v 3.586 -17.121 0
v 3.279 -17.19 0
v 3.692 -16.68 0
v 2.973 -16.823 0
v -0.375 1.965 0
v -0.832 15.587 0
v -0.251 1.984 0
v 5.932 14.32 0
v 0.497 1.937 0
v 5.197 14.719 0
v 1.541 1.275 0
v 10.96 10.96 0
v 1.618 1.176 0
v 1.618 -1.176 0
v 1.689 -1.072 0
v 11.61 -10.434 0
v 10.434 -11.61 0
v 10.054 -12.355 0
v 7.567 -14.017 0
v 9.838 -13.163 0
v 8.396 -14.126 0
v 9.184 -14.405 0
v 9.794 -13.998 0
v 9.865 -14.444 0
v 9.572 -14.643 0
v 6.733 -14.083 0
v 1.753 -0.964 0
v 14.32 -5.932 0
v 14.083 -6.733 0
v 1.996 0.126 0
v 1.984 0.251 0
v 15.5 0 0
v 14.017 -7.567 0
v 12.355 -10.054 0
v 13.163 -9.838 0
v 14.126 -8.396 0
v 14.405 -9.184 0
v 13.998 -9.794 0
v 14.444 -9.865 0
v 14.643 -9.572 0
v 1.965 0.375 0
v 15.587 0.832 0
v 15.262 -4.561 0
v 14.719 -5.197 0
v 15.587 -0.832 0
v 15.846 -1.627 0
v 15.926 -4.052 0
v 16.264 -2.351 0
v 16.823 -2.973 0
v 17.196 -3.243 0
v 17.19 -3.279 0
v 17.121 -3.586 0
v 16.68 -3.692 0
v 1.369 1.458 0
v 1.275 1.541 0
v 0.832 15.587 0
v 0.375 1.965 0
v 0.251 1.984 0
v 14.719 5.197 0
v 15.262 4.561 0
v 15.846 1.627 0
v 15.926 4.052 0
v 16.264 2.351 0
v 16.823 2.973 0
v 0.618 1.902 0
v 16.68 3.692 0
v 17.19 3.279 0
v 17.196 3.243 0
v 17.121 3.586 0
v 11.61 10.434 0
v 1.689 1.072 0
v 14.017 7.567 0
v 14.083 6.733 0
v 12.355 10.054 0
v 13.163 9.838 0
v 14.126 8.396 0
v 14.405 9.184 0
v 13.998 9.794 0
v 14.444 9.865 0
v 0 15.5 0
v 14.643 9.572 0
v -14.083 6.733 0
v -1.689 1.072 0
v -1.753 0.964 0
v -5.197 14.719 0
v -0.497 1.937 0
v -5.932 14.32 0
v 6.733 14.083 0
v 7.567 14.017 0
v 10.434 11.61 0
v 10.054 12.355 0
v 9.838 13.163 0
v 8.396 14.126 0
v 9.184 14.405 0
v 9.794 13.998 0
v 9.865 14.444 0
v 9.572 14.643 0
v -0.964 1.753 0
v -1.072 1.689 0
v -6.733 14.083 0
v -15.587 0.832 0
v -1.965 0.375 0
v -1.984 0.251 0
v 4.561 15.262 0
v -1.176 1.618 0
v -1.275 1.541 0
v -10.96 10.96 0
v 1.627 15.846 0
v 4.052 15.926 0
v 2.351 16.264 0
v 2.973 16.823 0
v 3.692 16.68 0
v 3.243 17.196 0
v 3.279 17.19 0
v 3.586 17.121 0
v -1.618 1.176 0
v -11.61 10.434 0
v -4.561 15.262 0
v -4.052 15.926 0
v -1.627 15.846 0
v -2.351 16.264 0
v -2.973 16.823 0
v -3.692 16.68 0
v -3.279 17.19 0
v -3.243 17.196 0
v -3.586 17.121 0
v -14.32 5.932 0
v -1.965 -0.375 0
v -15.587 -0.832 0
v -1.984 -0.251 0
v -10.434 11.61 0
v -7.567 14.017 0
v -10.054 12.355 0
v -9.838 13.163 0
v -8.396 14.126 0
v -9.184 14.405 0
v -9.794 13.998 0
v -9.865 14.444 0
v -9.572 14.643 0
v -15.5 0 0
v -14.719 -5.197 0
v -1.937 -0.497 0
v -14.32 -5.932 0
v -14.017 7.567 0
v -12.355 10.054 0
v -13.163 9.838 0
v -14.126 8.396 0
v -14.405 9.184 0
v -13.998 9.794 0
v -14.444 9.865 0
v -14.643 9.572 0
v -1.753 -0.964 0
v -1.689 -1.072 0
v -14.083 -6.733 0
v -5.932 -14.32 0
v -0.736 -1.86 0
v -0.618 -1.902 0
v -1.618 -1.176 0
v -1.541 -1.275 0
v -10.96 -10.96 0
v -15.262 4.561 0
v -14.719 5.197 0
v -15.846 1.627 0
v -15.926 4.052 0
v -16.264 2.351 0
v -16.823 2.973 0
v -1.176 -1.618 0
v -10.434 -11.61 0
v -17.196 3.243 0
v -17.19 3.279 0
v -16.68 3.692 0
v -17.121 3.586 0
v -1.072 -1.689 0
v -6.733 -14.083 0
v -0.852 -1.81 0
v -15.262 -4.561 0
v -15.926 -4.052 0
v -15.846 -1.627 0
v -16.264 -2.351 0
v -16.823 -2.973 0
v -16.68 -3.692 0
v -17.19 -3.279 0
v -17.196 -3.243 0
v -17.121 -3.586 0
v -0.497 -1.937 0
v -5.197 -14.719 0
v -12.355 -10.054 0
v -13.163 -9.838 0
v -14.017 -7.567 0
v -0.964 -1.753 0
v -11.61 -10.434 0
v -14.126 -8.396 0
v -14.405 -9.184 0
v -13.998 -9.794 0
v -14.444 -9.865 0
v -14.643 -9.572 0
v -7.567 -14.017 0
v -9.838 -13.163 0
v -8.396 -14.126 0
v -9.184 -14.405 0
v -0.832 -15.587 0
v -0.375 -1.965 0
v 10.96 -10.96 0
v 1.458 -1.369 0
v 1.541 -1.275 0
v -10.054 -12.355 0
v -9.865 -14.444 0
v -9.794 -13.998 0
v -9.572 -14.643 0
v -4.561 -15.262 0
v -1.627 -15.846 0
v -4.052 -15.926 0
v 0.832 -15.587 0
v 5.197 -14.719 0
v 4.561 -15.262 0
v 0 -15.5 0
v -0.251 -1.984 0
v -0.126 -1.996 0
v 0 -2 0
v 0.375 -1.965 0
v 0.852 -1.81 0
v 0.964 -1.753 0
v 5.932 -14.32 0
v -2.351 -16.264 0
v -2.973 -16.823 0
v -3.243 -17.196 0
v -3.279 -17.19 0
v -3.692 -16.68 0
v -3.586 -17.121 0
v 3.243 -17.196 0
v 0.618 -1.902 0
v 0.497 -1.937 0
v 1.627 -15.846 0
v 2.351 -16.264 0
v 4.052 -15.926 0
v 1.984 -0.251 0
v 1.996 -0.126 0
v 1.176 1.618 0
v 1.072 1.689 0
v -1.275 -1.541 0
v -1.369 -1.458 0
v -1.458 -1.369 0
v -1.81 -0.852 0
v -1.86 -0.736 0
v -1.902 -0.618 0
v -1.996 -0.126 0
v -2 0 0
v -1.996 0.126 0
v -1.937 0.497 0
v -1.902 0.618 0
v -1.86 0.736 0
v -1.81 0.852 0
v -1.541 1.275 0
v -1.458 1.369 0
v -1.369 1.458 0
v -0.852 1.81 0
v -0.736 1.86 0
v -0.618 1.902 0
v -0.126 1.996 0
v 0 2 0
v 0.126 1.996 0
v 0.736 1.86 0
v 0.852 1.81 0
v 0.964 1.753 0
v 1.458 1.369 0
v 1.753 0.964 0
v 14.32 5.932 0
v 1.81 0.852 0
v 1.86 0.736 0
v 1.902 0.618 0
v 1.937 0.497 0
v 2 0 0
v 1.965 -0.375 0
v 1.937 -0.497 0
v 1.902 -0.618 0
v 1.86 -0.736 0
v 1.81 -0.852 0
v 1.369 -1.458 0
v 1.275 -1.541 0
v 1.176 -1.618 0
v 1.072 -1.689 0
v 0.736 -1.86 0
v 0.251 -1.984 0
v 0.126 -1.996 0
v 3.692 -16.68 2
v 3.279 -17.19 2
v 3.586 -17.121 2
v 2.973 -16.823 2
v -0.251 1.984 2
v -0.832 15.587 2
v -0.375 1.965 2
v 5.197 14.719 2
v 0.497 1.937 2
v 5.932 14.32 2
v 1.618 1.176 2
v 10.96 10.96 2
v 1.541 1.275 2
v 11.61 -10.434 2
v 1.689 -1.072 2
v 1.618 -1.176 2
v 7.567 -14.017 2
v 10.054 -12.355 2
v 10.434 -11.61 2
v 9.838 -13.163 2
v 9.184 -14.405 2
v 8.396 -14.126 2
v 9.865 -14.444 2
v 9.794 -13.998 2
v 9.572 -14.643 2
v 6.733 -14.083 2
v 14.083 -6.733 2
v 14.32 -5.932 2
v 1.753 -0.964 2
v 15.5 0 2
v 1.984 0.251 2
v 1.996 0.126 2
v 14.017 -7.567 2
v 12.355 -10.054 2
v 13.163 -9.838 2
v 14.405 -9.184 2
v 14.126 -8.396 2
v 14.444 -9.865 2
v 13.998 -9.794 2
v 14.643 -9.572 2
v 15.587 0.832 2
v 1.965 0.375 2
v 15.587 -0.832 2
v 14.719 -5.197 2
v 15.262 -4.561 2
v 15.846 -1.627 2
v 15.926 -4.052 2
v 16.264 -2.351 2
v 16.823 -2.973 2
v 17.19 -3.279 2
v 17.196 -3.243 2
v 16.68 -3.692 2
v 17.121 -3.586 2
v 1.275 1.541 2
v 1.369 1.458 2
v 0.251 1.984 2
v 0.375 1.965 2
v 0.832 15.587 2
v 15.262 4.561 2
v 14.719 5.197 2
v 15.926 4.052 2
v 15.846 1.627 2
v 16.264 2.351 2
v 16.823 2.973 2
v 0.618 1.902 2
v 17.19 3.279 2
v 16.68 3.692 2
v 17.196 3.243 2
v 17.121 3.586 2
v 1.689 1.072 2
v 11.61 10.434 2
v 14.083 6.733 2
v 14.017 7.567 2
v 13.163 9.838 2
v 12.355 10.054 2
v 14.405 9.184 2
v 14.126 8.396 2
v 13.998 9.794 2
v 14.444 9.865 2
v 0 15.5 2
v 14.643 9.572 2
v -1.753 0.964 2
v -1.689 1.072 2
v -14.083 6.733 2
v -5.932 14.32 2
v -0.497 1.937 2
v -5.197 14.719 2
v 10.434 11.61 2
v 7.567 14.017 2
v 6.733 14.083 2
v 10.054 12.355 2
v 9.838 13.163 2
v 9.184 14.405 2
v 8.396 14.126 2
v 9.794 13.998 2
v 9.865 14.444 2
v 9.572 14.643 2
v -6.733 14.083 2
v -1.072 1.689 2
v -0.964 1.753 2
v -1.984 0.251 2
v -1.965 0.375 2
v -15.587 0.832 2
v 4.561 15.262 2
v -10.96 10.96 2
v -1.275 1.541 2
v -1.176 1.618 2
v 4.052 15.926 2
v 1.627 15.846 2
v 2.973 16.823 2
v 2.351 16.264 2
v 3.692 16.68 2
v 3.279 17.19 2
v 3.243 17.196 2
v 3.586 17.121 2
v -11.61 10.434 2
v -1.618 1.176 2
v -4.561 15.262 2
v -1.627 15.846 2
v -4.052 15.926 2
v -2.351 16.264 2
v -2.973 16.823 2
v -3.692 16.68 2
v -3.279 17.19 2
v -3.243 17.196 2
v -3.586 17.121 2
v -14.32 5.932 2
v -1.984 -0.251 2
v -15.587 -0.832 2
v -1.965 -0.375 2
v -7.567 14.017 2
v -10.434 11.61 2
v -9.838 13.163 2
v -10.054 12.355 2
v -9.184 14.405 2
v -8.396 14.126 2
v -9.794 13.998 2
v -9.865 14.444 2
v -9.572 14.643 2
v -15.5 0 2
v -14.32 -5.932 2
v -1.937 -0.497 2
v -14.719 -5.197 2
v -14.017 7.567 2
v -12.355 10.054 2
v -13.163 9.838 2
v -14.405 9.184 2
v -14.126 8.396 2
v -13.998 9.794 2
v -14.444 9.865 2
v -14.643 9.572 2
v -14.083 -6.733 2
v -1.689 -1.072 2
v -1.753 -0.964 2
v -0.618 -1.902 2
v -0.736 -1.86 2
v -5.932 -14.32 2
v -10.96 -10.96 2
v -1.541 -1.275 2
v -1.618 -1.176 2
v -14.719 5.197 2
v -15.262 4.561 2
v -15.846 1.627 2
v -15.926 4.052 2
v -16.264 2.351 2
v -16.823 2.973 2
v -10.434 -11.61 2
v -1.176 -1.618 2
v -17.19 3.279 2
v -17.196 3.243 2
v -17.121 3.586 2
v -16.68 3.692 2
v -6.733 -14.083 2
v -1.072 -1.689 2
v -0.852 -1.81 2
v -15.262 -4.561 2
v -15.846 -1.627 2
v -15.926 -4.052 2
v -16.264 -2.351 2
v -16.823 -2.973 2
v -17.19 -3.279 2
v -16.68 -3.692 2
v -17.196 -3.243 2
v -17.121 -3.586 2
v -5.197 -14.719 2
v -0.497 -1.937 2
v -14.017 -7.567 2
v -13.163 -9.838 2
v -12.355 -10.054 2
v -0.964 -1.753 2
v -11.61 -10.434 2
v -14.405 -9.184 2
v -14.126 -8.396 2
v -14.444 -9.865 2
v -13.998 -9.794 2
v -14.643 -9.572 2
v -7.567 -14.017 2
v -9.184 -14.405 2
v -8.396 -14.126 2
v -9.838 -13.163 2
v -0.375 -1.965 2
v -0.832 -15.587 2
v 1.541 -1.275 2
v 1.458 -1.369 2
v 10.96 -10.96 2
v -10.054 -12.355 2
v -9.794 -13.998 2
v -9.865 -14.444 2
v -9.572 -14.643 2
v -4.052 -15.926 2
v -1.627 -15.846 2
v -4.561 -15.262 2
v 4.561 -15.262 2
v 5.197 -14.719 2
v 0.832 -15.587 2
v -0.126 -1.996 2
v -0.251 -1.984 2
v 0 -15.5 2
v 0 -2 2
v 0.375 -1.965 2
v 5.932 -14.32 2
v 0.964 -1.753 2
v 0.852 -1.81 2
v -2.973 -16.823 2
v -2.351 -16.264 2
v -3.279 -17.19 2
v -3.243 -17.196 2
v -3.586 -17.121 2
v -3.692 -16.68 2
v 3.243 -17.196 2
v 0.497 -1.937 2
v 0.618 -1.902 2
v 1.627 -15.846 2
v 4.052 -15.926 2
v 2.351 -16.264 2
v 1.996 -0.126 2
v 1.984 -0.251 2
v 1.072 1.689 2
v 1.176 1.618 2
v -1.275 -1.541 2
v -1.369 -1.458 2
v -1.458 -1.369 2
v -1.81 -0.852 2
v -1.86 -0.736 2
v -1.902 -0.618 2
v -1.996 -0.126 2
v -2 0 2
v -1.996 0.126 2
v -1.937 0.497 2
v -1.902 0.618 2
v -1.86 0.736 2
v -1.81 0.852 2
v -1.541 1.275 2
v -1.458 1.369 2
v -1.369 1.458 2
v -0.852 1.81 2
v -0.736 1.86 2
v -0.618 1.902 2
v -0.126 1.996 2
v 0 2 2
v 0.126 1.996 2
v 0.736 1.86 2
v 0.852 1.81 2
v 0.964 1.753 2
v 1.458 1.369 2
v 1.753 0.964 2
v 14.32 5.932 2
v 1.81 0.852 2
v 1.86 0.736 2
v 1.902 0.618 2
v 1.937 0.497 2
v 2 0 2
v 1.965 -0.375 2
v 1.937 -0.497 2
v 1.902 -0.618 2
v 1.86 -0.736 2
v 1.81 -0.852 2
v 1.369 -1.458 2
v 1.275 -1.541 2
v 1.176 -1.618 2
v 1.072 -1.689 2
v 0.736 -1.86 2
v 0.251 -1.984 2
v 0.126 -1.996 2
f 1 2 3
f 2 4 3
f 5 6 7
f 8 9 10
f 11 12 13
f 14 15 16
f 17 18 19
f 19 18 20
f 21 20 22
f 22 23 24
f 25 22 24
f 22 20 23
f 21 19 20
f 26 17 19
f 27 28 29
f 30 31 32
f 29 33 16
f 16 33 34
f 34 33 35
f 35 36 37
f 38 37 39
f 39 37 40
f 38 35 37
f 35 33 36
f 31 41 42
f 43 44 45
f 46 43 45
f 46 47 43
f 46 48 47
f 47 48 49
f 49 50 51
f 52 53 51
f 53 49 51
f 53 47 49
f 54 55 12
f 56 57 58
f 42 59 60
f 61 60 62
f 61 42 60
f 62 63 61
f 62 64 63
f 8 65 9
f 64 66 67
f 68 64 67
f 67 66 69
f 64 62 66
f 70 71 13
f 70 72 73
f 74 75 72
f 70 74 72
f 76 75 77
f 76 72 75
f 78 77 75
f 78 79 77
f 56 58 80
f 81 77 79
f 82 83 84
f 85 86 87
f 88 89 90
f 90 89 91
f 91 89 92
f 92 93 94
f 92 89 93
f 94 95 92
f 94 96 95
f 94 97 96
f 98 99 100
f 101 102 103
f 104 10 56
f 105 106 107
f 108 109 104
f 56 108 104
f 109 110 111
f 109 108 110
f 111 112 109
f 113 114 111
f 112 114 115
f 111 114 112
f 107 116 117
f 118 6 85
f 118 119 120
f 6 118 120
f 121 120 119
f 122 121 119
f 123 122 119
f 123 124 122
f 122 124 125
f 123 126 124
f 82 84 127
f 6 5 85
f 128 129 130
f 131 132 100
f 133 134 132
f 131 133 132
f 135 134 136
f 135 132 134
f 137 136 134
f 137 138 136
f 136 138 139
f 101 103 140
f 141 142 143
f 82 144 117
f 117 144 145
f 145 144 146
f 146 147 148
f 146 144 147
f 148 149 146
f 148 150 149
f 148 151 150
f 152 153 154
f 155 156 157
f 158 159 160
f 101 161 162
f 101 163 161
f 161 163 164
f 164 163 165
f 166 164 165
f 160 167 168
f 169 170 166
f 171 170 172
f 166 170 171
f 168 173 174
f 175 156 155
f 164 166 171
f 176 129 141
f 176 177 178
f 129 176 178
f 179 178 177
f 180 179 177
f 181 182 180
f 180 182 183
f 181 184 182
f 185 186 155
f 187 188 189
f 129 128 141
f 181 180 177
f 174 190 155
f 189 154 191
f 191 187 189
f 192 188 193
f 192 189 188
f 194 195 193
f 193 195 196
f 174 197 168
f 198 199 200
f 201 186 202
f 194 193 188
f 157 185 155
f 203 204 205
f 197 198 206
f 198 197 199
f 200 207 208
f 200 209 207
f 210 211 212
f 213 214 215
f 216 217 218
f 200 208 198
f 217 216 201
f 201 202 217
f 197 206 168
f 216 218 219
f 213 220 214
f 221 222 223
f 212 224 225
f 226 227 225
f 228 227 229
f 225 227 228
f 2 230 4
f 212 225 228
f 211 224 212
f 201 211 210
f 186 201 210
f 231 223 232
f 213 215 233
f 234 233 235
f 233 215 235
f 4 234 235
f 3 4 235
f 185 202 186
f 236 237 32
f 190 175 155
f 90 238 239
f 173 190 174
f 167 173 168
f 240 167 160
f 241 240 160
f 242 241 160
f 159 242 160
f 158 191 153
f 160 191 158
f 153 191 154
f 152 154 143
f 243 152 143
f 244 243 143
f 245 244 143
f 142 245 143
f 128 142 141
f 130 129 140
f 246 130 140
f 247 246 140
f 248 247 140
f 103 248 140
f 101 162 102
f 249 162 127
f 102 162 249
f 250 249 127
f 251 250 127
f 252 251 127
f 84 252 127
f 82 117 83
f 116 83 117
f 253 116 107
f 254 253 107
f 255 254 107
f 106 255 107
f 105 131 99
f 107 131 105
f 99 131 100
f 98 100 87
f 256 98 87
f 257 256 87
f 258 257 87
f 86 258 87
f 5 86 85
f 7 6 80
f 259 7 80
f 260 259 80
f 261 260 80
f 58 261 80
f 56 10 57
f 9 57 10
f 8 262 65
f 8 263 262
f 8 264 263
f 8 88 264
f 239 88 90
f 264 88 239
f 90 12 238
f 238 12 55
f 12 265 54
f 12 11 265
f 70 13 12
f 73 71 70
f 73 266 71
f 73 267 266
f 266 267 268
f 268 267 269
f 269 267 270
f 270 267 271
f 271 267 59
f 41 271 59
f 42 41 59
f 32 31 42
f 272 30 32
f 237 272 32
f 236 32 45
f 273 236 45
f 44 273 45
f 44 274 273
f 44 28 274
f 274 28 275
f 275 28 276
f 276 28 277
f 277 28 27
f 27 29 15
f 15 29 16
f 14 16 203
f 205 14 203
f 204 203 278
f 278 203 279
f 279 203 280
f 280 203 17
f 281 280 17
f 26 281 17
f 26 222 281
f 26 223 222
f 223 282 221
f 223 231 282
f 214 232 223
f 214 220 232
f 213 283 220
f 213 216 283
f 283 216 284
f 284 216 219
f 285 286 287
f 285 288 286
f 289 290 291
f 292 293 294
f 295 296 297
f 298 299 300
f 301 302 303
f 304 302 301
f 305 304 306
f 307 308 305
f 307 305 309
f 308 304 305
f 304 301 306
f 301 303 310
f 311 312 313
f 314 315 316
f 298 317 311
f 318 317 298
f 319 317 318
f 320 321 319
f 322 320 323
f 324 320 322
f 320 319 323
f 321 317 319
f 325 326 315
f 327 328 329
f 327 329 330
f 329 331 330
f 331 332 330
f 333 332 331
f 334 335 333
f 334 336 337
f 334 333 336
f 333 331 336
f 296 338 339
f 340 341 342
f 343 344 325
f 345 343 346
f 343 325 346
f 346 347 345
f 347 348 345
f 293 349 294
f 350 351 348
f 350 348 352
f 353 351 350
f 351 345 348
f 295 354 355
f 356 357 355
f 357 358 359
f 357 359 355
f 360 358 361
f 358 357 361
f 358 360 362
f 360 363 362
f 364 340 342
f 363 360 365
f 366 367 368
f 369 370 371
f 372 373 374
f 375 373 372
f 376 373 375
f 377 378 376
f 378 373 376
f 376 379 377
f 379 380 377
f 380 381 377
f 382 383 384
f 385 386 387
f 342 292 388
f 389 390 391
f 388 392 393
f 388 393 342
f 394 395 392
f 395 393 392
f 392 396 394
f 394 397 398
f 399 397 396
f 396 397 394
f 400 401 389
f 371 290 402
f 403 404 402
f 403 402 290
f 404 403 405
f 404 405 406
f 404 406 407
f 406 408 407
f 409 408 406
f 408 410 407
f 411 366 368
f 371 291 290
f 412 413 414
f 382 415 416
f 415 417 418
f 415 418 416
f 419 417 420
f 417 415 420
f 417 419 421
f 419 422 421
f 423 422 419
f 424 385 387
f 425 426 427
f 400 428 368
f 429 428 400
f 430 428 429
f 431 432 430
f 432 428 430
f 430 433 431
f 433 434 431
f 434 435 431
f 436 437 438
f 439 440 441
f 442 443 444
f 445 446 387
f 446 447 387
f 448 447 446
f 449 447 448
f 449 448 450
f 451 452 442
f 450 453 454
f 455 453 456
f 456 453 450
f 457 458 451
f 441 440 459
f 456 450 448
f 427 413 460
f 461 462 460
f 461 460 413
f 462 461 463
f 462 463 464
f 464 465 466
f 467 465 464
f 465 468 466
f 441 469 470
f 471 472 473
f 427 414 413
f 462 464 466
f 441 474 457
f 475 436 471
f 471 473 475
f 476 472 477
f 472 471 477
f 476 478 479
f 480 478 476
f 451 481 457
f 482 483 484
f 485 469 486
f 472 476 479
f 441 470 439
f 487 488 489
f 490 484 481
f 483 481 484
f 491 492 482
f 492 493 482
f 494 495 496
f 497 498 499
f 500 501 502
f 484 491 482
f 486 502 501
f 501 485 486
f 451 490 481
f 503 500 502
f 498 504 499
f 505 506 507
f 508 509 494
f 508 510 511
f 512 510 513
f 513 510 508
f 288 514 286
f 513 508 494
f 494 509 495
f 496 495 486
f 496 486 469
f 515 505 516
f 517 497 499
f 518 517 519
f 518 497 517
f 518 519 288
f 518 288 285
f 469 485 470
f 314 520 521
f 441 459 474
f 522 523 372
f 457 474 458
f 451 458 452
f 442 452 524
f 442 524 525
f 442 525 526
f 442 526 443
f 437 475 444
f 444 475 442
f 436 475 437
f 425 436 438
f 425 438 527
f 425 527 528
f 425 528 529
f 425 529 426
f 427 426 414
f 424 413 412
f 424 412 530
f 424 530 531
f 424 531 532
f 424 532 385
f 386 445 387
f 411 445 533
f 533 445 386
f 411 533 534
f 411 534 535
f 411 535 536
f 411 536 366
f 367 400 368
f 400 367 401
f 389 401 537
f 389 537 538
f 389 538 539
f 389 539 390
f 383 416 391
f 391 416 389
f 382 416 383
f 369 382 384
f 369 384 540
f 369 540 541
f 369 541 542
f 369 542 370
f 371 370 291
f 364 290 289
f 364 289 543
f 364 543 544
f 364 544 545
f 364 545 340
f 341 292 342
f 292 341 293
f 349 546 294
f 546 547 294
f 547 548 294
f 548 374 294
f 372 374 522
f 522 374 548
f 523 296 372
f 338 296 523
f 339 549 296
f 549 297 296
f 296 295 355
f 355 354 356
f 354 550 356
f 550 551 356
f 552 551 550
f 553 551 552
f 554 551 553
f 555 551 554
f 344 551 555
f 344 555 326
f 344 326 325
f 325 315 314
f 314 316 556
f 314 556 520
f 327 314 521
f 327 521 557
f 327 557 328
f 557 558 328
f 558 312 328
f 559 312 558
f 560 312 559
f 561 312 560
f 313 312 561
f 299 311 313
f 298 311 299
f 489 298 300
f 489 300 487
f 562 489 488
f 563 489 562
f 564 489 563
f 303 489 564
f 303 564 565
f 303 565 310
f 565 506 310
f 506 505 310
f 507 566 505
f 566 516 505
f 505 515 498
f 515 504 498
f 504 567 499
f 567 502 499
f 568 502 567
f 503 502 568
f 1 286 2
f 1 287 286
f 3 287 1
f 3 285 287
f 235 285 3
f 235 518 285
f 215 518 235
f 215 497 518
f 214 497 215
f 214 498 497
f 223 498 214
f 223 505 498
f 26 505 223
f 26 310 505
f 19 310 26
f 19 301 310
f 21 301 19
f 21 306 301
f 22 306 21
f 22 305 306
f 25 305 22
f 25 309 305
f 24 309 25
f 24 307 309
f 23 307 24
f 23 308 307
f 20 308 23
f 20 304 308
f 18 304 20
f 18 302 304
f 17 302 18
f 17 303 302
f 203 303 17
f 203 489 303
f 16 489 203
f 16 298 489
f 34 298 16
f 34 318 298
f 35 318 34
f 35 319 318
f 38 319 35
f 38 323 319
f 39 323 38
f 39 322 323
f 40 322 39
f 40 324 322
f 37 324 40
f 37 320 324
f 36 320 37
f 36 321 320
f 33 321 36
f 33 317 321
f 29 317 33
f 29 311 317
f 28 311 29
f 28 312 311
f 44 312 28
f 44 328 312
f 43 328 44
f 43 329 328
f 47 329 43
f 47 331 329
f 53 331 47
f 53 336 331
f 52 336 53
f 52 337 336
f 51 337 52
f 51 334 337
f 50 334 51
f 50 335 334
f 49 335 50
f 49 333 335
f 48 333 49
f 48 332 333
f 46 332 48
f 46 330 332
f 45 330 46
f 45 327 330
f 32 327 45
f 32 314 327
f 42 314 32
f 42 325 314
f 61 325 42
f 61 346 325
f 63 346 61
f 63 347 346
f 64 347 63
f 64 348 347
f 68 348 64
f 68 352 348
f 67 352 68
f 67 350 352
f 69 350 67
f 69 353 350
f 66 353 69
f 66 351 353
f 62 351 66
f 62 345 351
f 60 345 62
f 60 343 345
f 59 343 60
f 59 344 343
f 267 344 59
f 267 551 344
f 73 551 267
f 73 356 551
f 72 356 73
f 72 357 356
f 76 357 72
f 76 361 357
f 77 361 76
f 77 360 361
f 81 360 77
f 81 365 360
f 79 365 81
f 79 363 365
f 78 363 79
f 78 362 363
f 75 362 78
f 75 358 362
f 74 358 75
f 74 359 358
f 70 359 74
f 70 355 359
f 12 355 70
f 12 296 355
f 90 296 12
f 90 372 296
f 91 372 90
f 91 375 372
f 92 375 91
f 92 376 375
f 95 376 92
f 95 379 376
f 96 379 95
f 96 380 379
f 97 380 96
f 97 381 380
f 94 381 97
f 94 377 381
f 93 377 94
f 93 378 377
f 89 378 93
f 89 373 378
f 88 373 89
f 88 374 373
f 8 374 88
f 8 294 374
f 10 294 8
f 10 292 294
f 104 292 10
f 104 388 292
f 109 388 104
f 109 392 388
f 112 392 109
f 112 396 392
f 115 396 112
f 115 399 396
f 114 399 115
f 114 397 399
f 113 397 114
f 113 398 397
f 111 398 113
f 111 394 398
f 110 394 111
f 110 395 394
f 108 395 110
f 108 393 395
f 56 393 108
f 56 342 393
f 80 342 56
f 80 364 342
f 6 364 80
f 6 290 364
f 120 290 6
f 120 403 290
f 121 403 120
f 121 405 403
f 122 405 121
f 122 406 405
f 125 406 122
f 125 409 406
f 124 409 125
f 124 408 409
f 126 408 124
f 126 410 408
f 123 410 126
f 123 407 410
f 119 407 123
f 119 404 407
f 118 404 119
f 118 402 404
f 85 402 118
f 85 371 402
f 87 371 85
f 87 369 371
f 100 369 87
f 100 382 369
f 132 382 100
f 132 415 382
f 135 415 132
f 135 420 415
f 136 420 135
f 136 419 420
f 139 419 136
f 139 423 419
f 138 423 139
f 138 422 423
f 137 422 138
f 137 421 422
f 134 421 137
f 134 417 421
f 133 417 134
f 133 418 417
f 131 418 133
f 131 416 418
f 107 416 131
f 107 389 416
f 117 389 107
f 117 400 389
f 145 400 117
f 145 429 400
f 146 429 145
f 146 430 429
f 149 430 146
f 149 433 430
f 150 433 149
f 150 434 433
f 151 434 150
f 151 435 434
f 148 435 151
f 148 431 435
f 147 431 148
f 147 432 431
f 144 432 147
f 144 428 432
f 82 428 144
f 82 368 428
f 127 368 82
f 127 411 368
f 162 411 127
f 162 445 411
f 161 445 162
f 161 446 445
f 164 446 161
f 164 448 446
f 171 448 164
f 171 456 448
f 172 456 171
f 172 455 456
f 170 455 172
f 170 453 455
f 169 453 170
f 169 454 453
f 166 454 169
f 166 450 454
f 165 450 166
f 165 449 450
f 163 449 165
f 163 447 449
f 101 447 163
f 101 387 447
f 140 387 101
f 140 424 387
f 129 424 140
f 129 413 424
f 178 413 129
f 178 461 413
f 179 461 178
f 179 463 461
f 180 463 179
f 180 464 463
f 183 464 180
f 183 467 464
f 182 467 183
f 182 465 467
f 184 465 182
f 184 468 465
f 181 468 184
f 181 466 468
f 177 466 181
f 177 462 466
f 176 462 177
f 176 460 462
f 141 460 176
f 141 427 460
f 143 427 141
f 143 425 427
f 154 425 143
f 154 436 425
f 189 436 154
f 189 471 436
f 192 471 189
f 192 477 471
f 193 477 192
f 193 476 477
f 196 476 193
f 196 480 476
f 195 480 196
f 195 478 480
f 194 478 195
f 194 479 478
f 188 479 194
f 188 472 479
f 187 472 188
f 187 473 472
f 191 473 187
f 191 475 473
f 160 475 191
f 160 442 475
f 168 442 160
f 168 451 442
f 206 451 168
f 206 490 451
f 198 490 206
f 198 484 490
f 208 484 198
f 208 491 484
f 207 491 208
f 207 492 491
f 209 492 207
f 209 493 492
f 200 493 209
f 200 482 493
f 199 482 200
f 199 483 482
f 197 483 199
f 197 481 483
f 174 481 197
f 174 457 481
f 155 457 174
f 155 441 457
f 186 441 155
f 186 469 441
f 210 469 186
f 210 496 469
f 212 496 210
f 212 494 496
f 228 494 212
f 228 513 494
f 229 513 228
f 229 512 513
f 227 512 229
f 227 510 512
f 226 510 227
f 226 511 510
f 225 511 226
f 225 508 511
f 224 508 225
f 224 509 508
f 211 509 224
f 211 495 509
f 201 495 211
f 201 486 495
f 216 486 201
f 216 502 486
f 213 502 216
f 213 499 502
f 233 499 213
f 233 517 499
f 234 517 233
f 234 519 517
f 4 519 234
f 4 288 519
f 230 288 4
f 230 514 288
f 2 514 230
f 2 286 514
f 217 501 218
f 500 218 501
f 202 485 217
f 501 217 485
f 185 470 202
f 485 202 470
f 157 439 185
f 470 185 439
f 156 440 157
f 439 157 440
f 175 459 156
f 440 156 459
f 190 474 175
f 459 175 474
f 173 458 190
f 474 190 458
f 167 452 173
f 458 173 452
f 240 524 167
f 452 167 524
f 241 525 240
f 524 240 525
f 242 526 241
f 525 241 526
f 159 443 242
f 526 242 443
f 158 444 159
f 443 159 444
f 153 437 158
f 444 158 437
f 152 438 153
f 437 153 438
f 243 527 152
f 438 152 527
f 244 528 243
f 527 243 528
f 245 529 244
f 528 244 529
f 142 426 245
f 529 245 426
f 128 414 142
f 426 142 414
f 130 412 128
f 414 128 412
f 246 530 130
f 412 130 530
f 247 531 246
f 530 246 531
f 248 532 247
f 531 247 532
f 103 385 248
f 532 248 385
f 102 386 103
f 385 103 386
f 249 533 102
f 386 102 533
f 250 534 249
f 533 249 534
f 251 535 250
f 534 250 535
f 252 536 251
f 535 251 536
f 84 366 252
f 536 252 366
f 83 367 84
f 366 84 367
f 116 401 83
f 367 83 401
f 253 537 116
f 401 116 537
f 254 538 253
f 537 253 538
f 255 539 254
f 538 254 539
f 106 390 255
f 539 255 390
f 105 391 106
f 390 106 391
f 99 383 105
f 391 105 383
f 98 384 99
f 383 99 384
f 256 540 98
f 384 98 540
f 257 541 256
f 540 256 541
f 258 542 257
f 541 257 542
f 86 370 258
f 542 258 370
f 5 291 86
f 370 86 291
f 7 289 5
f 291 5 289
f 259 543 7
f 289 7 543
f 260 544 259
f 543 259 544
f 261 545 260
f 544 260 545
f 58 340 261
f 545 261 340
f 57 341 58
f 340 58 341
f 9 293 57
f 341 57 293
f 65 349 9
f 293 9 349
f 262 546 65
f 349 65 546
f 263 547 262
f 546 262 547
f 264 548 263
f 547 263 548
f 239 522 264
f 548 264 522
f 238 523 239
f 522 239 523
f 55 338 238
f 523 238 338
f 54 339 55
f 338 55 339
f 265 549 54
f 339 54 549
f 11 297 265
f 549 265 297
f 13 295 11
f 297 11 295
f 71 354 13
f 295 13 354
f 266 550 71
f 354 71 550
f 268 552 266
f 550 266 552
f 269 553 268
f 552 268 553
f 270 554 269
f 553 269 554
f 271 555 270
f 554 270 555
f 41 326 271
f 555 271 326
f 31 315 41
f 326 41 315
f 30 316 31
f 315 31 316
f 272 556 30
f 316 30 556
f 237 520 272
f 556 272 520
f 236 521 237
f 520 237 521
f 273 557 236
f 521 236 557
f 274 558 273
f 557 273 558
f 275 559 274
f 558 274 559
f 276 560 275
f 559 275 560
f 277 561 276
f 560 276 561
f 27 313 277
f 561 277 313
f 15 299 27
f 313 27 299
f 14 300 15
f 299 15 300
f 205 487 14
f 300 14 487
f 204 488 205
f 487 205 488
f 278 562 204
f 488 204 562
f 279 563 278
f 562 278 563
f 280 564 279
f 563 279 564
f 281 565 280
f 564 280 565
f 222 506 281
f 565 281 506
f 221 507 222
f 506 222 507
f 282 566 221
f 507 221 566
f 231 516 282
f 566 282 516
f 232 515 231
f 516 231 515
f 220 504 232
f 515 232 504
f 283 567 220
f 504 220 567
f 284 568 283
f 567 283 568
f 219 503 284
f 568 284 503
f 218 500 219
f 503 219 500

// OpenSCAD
outer_diameter = 35;
inner_diameter = 4;
ring_height = 2;
num_holes = 16;
hole_diameter = 8;
hole_radius = outer_diameter / 2 ;


module ring2D() {
    difference() {
        // Outer ring shape
        difference() {
            circle(outer_diameter / 2, $fn=100);
            circle(inner_diameter / 2, $fn=100);
        }
        // Add circular cutouts
        for (i = [0 : 360 / num_holes : 360 - (360 / num_holes)]) {
            rotate(i)
                translate([hole_radius + hole_diameter / 4, 0])
                    circle(hole_diameter / 2, $fn=30);
                    
        }
    }
}

// Now extrude the entire 2D shape once
linear_extrude(height = ring_height){
    ring2D();
}
